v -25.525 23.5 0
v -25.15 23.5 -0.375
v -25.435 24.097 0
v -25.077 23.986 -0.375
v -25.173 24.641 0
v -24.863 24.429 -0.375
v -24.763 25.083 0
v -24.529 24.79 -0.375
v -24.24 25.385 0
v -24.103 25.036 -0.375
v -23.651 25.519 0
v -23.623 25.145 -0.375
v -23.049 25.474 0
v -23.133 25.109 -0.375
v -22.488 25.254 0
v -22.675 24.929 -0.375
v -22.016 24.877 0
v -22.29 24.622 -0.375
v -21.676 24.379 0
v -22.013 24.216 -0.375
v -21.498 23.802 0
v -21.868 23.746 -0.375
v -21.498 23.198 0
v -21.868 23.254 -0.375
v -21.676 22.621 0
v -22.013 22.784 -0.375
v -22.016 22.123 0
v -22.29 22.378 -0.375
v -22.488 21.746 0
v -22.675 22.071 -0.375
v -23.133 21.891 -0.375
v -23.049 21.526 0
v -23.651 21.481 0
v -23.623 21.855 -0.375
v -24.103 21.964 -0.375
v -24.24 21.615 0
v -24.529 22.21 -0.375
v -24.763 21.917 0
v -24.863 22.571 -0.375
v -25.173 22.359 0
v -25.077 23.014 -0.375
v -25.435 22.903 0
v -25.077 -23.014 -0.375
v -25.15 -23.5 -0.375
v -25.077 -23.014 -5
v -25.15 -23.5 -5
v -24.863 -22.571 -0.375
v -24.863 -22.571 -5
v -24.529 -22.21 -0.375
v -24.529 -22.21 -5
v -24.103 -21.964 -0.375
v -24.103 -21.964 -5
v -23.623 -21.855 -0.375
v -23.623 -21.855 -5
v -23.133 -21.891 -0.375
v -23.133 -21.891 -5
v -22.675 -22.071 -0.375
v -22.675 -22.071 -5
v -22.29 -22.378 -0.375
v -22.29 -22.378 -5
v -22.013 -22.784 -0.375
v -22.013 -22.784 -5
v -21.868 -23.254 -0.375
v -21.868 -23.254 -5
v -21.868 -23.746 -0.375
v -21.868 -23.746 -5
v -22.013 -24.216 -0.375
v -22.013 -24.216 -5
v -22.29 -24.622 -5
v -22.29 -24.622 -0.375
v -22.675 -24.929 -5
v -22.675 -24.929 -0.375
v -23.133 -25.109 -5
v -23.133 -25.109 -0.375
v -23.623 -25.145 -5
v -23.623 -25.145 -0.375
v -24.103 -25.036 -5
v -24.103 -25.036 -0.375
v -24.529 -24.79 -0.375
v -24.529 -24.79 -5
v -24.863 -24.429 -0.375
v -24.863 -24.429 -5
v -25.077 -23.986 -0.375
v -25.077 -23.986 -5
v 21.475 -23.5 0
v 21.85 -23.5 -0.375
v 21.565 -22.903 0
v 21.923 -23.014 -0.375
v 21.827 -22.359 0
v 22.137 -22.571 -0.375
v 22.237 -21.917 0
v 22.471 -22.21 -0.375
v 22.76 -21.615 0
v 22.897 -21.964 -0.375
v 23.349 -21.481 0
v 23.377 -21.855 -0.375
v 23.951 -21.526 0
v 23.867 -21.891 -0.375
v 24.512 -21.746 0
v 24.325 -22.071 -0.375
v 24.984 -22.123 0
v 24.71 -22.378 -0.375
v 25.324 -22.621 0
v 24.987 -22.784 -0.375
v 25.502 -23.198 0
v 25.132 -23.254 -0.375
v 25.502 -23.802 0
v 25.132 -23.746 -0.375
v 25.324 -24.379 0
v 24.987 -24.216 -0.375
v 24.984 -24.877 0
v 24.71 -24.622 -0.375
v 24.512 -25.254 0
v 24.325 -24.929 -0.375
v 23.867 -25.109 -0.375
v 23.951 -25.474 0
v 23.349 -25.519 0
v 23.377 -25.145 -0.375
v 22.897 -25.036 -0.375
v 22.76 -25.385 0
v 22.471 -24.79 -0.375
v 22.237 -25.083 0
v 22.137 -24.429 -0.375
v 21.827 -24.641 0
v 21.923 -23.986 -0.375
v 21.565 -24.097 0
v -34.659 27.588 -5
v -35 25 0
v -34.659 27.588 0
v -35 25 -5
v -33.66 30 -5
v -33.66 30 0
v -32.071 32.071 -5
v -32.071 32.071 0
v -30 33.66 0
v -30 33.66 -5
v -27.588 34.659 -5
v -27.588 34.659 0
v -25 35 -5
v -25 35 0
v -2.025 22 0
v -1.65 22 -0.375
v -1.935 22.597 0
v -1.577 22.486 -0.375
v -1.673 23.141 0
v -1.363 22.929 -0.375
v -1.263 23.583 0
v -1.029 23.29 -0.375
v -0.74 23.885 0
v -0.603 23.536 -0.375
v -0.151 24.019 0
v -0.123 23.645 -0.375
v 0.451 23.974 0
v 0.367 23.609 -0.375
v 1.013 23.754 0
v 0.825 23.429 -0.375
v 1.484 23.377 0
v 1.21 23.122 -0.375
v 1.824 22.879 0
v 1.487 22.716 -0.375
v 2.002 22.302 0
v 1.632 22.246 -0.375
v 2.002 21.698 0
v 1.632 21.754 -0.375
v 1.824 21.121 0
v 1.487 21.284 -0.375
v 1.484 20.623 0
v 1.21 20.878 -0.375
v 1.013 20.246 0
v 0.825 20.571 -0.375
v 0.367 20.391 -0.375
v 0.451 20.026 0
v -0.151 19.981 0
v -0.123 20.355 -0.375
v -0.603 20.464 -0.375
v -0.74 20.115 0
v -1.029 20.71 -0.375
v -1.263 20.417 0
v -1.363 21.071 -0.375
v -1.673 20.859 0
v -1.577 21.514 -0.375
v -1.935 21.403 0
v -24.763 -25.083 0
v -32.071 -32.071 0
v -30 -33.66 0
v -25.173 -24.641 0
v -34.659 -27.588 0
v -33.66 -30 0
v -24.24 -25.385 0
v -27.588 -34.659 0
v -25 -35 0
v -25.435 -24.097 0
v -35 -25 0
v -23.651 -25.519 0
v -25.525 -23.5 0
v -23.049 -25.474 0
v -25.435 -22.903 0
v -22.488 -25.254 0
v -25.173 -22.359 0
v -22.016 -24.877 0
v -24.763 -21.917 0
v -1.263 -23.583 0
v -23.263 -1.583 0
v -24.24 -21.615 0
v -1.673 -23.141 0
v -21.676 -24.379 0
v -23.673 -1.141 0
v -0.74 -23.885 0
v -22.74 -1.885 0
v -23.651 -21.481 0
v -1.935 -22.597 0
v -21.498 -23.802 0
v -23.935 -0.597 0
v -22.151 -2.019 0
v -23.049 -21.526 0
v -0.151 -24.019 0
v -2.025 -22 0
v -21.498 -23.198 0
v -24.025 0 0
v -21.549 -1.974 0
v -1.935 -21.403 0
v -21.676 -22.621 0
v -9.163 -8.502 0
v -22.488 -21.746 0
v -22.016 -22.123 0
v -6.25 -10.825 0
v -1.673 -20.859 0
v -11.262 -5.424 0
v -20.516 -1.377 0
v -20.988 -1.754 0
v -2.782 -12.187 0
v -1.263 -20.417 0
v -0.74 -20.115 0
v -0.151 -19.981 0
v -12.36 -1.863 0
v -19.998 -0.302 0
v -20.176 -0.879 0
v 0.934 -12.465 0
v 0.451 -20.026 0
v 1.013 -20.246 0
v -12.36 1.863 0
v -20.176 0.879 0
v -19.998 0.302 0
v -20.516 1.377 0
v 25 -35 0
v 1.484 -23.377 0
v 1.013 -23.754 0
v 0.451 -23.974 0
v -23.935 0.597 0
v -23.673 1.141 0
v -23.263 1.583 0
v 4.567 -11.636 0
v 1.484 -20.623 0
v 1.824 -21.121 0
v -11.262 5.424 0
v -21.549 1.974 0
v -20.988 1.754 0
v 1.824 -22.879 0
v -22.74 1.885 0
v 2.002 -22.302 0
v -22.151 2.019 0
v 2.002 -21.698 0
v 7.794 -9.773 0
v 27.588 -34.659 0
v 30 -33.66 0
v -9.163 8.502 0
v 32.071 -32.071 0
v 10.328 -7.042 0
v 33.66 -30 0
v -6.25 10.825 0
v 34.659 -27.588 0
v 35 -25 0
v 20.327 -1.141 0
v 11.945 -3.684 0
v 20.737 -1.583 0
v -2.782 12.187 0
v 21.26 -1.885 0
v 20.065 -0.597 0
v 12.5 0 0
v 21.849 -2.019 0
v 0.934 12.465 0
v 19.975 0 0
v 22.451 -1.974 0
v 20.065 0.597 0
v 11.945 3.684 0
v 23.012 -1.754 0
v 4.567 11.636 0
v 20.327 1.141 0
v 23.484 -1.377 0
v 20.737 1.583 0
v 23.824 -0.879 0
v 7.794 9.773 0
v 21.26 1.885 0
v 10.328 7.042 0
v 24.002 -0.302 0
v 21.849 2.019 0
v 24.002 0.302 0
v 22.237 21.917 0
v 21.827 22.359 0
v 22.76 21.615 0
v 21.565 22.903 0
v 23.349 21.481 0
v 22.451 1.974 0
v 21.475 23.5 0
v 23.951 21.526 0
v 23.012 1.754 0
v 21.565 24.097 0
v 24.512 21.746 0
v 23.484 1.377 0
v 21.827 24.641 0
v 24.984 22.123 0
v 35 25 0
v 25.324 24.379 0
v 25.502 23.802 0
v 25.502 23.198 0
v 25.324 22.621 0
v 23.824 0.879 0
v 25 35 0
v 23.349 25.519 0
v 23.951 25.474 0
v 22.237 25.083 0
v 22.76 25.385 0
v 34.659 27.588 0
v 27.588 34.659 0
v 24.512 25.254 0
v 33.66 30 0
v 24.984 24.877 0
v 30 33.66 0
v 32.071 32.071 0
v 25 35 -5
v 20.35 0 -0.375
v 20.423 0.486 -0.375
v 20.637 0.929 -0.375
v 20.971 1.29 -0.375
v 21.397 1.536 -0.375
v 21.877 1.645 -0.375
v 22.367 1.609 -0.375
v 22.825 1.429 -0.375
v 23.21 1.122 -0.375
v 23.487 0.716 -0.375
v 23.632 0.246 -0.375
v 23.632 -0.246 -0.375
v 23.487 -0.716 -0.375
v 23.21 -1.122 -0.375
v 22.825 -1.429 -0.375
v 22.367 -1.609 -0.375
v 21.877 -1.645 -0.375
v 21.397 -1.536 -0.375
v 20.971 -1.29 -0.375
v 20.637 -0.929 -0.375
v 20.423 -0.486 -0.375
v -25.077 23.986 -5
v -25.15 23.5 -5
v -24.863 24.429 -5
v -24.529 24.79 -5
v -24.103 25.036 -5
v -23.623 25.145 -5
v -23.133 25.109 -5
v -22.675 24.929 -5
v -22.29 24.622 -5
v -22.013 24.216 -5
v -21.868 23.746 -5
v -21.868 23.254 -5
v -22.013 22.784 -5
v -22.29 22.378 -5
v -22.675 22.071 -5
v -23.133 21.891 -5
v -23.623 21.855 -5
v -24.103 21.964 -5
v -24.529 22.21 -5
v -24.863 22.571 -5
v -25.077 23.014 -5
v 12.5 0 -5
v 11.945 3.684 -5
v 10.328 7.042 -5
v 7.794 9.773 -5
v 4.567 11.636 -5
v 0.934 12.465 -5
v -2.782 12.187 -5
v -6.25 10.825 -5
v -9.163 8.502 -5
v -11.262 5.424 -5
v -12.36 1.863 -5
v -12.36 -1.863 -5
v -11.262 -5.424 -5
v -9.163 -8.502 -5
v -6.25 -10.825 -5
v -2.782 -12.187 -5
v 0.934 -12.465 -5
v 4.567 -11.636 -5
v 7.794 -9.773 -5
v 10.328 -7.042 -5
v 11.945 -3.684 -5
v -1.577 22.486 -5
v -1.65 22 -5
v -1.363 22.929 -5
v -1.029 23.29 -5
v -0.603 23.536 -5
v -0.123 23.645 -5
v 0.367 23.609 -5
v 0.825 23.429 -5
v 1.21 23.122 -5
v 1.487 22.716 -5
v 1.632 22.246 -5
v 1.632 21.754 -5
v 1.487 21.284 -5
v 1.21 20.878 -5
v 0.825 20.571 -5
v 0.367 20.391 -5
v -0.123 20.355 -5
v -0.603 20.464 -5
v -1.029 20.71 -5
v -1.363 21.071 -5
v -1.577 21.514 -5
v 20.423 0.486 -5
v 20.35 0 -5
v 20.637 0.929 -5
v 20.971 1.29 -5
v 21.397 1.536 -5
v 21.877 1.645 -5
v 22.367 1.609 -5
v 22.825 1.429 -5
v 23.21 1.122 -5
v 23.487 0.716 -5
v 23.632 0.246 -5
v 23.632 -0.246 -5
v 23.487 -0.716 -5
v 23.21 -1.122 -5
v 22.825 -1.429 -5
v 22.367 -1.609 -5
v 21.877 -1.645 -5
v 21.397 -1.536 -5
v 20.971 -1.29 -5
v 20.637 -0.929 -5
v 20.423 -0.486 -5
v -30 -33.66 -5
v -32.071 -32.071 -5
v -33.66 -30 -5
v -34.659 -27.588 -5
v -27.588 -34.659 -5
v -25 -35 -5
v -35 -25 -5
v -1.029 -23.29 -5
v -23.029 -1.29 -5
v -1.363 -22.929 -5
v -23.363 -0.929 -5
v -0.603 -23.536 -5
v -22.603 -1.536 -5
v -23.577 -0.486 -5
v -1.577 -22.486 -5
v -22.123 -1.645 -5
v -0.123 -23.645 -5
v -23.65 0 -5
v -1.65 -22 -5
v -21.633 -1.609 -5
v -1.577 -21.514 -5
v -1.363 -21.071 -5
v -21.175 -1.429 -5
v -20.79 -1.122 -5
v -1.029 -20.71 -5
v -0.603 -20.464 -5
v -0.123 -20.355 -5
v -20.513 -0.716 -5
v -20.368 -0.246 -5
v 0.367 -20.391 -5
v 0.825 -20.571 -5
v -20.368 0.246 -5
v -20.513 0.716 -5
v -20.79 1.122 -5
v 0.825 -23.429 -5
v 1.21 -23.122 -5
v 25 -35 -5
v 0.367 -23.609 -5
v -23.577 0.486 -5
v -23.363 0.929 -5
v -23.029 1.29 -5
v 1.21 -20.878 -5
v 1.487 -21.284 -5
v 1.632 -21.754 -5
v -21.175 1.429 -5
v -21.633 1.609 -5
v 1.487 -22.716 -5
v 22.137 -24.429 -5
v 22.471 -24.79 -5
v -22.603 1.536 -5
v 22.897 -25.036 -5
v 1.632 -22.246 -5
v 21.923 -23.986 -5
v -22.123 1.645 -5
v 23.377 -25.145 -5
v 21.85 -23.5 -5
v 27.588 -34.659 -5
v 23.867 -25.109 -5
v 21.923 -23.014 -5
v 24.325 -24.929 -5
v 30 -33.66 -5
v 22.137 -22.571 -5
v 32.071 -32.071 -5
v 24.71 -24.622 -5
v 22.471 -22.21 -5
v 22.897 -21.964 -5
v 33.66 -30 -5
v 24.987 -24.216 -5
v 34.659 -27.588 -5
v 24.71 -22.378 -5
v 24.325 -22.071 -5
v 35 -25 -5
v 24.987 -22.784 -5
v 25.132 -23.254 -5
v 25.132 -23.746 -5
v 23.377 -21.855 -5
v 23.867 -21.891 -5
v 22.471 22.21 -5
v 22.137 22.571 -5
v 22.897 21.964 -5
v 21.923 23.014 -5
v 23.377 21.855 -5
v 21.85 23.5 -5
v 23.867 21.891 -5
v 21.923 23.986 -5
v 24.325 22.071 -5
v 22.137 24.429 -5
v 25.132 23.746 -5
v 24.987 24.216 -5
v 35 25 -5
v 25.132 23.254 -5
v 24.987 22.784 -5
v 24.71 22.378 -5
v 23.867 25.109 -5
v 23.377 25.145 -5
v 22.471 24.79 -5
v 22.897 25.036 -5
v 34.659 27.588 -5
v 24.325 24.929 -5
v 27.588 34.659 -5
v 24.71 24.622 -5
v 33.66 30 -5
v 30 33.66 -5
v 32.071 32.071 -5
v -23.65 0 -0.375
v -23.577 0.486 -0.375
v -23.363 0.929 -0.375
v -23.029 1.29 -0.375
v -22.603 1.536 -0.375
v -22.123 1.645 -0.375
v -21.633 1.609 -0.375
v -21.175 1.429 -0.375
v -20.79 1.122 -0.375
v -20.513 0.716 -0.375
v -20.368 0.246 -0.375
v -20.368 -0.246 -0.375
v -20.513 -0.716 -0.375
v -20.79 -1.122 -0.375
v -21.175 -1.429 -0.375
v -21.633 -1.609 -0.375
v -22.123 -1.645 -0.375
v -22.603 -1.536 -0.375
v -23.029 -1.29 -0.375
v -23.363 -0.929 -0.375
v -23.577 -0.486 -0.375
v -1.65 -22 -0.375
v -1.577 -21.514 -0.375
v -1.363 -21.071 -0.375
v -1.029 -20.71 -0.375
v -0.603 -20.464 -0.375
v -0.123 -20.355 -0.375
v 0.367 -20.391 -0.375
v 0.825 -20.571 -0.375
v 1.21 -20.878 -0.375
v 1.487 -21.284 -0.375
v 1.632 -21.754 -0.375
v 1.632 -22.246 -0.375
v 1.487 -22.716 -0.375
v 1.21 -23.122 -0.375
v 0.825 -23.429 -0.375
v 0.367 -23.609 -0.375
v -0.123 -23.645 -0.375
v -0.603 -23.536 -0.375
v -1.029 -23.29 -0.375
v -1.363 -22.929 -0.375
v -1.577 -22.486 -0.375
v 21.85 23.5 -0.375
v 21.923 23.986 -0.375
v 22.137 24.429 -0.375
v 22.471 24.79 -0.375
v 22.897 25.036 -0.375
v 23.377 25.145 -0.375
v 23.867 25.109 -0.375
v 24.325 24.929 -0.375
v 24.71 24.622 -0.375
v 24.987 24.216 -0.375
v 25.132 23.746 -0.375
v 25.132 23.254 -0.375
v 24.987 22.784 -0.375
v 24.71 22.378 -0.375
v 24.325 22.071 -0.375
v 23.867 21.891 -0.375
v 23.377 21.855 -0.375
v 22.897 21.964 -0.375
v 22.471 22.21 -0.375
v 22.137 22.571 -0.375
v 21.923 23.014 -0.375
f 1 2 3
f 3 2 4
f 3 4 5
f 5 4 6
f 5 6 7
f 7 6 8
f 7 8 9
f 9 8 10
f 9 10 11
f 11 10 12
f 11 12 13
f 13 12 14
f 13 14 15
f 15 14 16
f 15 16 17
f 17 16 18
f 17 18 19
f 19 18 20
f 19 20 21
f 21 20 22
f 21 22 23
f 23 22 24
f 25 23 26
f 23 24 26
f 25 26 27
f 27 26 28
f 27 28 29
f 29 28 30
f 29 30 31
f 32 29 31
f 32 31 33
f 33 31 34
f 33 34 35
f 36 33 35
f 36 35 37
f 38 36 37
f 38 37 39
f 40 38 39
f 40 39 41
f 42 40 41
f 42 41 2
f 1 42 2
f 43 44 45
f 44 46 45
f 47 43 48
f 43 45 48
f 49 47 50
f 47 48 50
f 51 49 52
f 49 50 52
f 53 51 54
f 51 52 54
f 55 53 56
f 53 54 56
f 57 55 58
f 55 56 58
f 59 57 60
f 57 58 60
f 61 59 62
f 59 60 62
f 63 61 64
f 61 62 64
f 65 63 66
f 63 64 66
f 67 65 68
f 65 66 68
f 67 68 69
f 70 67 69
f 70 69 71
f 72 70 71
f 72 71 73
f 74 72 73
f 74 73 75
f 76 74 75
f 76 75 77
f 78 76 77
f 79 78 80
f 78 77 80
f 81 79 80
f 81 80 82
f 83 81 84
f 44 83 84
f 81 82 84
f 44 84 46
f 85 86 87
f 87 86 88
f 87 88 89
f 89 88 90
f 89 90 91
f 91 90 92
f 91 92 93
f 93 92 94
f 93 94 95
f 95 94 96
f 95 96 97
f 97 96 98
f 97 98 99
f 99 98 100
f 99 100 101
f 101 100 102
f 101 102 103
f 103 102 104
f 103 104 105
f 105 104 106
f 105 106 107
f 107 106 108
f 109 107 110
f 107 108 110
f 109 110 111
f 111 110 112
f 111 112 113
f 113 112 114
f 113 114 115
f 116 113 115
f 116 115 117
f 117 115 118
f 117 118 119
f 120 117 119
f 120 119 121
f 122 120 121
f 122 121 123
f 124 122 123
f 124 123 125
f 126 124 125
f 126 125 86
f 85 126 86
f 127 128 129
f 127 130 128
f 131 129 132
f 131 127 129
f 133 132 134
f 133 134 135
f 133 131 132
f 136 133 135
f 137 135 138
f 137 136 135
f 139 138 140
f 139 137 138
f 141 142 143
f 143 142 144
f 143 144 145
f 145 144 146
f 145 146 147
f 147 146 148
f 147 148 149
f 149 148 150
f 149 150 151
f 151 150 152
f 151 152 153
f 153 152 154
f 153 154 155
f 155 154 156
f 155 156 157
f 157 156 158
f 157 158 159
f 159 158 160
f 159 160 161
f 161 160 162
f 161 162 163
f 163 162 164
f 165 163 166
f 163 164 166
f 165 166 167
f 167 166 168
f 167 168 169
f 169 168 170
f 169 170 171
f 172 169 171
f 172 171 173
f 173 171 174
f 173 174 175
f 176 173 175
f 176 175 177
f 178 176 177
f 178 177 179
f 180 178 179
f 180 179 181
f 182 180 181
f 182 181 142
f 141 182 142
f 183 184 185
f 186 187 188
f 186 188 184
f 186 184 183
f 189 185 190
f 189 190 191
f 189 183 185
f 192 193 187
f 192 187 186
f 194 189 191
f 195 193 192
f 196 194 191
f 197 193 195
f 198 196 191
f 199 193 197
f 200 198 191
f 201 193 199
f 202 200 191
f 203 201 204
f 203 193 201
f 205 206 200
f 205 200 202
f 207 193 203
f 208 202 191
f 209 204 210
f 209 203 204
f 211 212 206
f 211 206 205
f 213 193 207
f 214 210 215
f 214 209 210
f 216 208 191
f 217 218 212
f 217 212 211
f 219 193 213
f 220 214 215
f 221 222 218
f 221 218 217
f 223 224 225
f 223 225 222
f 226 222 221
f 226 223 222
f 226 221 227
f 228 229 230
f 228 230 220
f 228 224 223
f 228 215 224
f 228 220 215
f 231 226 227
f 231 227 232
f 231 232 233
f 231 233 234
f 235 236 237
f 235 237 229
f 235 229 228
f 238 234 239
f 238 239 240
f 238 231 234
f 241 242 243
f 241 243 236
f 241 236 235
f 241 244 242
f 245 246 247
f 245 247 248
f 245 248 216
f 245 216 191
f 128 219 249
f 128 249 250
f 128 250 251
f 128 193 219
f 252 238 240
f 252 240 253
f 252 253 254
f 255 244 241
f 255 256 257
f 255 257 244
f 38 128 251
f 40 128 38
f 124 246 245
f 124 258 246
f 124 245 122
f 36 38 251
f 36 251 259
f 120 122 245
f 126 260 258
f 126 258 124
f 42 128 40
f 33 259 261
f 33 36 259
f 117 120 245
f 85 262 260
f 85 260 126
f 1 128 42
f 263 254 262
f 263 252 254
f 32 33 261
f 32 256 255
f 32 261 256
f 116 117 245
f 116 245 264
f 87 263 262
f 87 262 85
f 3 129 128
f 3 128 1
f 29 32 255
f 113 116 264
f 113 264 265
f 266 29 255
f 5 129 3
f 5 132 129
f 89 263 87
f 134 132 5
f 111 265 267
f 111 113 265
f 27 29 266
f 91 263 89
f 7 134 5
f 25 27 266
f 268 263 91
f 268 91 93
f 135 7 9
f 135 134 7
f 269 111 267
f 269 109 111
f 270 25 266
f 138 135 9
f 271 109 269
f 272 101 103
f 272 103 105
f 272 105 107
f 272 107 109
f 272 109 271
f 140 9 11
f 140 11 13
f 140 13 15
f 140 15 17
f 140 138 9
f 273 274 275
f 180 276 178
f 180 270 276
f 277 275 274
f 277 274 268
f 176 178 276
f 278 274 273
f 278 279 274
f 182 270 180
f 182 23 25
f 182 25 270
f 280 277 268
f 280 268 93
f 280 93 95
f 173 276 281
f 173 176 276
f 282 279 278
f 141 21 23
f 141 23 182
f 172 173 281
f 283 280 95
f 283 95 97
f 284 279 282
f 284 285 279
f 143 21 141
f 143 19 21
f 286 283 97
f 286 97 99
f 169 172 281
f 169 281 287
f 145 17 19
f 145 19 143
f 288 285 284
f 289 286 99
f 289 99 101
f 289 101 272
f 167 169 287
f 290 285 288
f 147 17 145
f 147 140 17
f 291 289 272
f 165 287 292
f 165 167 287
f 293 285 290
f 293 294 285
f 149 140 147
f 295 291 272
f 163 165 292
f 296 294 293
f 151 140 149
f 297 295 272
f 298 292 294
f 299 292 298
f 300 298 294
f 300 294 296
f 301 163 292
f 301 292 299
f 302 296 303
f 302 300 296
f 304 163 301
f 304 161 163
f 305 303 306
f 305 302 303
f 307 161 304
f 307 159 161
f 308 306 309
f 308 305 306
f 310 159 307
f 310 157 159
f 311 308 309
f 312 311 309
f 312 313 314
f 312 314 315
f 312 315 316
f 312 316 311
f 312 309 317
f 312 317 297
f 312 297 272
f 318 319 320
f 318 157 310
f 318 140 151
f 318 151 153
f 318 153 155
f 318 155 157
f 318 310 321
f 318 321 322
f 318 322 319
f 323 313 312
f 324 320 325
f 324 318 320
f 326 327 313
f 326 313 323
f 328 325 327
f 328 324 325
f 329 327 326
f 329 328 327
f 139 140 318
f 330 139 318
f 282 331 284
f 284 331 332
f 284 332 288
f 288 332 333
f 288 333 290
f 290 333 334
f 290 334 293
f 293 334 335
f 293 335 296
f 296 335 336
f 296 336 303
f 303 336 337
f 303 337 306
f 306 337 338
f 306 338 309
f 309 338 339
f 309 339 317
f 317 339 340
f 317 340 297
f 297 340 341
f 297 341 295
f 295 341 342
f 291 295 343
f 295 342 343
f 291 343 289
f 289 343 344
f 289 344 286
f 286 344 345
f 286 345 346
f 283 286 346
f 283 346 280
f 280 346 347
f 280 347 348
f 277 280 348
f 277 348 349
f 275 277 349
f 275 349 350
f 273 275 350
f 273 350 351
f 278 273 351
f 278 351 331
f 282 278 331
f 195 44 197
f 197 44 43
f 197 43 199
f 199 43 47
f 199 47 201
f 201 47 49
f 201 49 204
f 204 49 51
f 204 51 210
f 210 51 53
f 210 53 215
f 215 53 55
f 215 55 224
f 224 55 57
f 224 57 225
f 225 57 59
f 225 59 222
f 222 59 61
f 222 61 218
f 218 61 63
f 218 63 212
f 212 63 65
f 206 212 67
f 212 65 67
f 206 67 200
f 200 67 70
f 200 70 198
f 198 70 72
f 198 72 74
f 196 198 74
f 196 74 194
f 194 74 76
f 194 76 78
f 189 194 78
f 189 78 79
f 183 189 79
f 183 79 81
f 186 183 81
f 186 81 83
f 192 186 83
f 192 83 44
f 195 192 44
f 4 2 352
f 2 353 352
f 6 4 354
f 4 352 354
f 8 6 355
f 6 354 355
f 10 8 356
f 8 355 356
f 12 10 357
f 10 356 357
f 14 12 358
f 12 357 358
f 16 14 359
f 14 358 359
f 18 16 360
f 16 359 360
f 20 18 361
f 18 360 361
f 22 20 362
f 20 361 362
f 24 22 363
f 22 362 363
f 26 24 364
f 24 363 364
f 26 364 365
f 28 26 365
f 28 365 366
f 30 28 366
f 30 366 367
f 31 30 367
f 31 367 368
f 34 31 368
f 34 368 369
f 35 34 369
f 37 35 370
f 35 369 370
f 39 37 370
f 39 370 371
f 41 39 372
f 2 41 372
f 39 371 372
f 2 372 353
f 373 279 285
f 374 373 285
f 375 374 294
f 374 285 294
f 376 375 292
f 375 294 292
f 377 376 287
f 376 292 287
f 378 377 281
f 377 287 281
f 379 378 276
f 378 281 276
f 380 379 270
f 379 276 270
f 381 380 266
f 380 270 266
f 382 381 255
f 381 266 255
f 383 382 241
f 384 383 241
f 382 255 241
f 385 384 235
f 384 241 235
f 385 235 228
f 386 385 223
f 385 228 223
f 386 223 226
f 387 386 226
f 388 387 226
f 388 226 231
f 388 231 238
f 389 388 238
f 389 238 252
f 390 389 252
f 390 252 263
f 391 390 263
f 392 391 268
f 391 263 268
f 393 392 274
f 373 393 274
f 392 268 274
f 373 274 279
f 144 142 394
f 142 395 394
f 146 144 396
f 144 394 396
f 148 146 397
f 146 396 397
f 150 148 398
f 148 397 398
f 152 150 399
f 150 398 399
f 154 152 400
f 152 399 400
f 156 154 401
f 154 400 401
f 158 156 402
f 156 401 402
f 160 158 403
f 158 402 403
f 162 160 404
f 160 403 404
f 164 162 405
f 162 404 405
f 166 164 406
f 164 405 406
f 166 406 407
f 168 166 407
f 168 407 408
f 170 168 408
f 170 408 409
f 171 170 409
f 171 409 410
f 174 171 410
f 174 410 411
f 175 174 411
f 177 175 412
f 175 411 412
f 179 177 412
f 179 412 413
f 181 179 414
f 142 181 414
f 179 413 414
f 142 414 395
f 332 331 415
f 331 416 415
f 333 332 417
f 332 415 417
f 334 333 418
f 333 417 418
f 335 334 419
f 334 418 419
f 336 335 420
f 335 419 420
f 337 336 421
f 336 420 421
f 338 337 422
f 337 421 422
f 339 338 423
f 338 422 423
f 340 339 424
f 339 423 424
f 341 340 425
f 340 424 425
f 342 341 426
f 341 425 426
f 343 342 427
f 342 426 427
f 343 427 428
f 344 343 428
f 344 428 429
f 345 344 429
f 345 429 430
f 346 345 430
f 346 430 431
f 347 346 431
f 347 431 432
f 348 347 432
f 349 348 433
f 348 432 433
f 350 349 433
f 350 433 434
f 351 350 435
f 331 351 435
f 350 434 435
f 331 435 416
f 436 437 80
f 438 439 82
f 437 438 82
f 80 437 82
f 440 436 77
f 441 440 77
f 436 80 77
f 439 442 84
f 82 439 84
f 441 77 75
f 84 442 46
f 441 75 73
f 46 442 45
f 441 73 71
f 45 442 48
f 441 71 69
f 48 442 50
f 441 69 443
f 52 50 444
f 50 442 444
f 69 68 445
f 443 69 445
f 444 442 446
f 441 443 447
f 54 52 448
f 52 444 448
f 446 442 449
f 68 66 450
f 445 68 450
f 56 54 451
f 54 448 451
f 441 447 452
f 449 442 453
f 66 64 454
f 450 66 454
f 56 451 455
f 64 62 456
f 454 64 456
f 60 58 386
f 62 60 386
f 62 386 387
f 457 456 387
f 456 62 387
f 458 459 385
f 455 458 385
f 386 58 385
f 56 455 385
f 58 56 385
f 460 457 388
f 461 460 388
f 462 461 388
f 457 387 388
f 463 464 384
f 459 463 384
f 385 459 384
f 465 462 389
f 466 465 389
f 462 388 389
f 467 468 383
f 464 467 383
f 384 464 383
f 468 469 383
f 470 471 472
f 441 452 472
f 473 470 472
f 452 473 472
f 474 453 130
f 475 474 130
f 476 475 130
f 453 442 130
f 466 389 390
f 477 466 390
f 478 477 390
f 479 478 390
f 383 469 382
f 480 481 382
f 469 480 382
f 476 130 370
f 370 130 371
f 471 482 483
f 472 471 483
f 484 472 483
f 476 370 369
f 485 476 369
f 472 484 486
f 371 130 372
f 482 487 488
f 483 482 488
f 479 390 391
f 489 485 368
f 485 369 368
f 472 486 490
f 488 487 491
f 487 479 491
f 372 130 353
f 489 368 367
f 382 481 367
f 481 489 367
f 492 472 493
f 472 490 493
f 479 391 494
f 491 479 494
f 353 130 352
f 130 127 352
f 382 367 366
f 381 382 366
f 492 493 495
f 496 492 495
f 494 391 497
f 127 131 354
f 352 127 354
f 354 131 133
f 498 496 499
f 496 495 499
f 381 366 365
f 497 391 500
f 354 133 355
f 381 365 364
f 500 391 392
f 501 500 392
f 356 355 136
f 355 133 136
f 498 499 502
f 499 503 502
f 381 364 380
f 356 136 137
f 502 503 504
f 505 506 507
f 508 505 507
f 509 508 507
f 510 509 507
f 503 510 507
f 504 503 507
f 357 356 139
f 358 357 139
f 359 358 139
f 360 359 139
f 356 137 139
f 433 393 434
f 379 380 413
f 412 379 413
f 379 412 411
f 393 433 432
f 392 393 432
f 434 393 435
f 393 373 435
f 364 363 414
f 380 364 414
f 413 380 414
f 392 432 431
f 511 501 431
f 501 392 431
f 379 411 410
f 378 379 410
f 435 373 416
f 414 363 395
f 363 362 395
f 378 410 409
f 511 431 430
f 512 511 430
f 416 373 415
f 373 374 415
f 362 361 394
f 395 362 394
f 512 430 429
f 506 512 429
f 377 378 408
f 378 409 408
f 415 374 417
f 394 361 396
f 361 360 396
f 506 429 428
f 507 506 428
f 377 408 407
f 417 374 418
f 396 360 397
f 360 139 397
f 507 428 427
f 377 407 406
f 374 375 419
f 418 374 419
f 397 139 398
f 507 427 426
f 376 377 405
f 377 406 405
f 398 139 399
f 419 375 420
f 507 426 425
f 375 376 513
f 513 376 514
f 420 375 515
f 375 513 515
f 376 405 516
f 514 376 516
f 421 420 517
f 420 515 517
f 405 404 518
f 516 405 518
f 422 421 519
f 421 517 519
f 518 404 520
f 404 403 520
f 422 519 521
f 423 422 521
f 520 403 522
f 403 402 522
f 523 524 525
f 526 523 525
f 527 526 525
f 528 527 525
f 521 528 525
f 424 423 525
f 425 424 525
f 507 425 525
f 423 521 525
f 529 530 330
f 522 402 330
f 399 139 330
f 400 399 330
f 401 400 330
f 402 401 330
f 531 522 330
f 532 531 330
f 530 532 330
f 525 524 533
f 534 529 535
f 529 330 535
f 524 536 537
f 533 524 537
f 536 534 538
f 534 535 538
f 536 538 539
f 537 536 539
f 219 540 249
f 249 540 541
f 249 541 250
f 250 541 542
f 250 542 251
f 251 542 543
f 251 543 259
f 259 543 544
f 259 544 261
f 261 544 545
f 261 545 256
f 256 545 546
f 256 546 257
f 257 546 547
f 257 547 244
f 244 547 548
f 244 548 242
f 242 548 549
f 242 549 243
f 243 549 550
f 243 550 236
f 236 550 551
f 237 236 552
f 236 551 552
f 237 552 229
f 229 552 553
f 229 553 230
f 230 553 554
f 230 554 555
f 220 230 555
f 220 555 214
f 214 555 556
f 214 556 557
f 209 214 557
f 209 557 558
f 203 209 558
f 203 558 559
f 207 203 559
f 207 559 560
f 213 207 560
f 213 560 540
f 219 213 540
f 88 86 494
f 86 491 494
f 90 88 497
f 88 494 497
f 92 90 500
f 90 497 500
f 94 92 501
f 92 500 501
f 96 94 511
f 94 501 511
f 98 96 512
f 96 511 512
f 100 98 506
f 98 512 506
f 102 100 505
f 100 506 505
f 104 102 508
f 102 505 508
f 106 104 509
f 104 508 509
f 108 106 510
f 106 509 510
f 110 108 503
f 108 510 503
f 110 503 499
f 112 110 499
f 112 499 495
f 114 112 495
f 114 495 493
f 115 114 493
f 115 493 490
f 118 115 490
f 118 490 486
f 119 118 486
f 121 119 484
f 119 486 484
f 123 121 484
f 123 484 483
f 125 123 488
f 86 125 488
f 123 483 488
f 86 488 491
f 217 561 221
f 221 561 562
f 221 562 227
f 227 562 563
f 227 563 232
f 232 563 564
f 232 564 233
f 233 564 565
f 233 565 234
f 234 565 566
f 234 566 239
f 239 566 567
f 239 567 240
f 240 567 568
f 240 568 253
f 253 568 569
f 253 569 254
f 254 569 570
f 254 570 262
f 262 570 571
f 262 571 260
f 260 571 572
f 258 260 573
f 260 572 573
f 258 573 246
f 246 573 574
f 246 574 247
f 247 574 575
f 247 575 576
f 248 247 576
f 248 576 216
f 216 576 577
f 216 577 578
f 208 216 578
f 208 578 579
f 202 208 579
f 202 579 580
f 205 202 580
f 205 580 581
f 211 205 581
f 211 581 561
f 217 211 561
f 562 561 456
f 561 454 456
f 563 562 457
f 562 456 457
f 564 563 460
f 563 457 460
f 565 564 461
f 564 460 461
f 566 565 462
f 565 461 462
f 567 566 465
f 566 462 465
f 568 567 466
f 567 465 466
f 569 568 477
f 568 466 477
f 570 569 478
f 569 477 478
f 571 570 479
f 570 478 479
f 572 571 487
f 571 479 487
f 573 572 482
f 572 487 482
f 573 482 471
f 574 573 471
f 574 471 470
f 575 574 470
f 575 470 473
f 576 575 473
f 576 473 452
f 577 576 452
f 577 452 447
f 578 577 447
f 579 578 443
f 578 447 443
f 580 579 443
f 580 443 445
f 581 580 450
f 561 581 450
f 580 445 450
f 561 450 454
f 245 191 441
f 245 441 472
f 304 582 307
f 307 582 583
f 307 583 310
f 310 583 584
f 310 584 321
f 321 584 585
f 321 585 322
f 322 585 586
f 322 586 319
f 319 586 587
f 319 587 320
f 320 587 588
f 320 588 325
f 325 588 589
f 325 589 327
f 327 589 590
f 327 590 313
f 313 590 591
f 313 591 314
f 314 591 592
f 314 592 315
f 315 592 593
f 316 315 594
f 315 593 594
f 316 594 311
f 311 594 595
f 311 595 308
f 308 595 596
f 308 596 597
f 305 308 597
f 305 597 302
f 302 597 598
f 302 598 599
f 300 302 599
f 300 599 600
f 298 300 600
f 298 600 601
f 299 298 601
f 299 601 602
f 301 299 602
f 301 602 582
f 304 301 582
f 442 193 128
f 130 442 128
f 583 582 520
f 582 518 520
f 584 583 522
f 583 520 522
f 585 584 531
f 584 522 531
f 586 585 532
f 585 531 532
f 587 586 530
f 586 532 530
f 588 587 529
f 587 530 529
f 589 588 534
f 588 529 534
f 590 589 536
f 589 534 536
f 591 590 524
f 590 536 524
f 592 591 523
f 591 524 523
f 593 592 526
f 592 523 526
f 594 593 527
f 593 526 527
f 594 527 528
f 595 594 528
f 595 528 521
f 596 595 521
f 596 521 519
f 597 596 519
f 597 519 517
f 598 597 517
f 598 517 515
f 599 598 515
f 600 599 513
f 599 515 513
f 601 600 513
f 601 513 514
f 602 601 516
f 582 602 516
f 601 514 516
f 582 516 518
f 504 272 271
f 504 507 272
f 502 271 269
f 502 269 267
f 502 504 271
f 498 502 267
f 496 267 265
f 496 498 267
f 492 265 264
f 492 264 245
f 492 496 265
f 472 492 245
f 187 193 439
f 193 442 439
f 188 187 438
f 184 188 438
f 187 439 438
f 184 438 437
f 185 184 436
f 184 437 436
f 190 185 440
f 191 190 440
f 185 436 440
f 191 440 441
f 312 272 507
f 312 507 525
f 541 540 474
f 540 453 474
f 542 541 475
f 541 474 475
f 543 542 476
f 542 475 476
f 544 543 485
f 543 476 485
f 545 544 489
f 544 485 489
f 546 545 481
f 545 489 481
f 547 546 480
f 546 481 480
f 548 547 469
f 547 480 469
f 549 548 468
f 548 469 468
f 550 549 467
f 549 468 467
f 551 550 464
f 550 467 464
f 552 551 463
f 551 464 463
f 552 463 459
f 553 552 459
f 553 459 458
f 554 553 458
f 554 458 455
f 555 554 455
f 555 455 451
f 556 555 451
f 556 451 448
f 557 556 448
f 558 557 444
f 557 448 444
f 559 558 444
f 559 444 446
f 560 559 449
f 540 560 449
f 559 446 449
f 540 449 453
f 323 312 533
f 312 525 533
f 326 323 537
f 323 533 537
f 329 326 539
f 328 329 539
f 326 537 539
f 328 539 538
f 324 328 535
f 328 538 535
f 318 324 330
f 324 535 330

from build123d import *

# Parameters (mm, degrees)
SKETCH1_W                       = 70
SKETCH1_H                       = 70
SKETCH1_R                       = 12.5
BASE_FLANGE1_DEPTH              = 5
M4X0_7_TAPPED_HOLE1_D           = 3.3
M4X0_7_TAPPED_HOLE1_DEPTH       = 10.1
M4X0_7_TAPPED_HOLE1_CSINK_D     = 4.05
M4X0_7_TAPPED_HOLE1_CSINK_ANGLE = 90
M4X0_7_TAPPED_HOLE1_TIP         = 0.991420021
M4X0_7_TAPPED_HOLE2_D           = 3.3
M4X0_7_TAPPED_HOLE2_DEPTH       = 10.1
M4X0_7_TAPPED_HOLE2_CSINK_D     = 4.05
M4X0_7_TAPPED_HOLE2_CSINK_ANGLE = 90
M4X0_7_TAPPED_HOLE2_TIP         = 0.991420021
FILLET1_R                       = 10


# Sheet-metal steps are written as plain solids
with BuildPart() as part:
    # Sketch1 → Base-Flange1 (new body)
    with BuildSketch(Plane.XY):
        Rectangle(SKETCH1_W, SKETCH1_H)
        Circle(SKETCH1_R, mode=Mode.SUBTRACT)
    extrude(amount=-BASE_FLANGE1_DEPTH)

    # M4x0.7 Tapped Hole1
    with Locations(Plane.XY):
        with Locations((0, 22), (-22, 0), (0, -22), (22, 0)):
            CounterSinkHole(M4X0_7_TAPPED_HOLE1_D / 2, M4X0_7_TAPPED_HOLE1_CSINK_D / 2, depth=M4X0_7_TAPPED_HOLE1_DEPTH, counter_sink_angle=M4X0_7_TAPPED_HOLE1_CSINK_ANGLE)
            with Locations((0, 0, -(M4X0_7_TAPPED_HOLE1_DEPTH + M4X0_7_TAPPED_HOLE1_TIP / 2))):  # 118° drill point
                Cone(0, M4X0_7_TAPPED_HOLE1_D / 2, M4X0_7_TAPPED_HOLE1_TIP, mode=Mode.SUBTRACT)

    # M4x0.7 Tapped Hole2
    with Locations(Plane.XY):
        with Locations((-23.5, 23.5), (23.5, 23.5), (23.5, -23.5), (-23.5, -23.5)):
            CounterSinkHole(M4X0_7_TAPPED_HOLE2_D / 2, M4X0_7_TAPPED_HOLE2_CSINK_D / 2, depth=M4X0_7_TAPPED_HOLE2_DEPTH, counter_sink_angle=M4X0_7_TAPPED_HOLE2_CSINK_ANGLE)
            with Locations((0, 0, -(M4X0_7_TAPPED_HOLE2_DEPTH + M4X0_7_TAPPED_HOLE2_TIP / 2))):  # 118° drill point
                Cone(0, M4X0_7_TAPPED_HOLE2_D / 2, M4X0_7_TAPPED_HOLE2_TIP, mode=Mode.SUBTRACT)

    # Fillet1
    fillet1_edges = [part.edges().sort_by_distance(p)[0] for p in [
        (35, -35, -2.5),
        (-35, -35, -2.5),
        (-35, 35, -2.5),
        (35, 35, -2.5),
    ]]
    fillet(fillet1_edges, radius=FILLET1_R)


solid = part.part
